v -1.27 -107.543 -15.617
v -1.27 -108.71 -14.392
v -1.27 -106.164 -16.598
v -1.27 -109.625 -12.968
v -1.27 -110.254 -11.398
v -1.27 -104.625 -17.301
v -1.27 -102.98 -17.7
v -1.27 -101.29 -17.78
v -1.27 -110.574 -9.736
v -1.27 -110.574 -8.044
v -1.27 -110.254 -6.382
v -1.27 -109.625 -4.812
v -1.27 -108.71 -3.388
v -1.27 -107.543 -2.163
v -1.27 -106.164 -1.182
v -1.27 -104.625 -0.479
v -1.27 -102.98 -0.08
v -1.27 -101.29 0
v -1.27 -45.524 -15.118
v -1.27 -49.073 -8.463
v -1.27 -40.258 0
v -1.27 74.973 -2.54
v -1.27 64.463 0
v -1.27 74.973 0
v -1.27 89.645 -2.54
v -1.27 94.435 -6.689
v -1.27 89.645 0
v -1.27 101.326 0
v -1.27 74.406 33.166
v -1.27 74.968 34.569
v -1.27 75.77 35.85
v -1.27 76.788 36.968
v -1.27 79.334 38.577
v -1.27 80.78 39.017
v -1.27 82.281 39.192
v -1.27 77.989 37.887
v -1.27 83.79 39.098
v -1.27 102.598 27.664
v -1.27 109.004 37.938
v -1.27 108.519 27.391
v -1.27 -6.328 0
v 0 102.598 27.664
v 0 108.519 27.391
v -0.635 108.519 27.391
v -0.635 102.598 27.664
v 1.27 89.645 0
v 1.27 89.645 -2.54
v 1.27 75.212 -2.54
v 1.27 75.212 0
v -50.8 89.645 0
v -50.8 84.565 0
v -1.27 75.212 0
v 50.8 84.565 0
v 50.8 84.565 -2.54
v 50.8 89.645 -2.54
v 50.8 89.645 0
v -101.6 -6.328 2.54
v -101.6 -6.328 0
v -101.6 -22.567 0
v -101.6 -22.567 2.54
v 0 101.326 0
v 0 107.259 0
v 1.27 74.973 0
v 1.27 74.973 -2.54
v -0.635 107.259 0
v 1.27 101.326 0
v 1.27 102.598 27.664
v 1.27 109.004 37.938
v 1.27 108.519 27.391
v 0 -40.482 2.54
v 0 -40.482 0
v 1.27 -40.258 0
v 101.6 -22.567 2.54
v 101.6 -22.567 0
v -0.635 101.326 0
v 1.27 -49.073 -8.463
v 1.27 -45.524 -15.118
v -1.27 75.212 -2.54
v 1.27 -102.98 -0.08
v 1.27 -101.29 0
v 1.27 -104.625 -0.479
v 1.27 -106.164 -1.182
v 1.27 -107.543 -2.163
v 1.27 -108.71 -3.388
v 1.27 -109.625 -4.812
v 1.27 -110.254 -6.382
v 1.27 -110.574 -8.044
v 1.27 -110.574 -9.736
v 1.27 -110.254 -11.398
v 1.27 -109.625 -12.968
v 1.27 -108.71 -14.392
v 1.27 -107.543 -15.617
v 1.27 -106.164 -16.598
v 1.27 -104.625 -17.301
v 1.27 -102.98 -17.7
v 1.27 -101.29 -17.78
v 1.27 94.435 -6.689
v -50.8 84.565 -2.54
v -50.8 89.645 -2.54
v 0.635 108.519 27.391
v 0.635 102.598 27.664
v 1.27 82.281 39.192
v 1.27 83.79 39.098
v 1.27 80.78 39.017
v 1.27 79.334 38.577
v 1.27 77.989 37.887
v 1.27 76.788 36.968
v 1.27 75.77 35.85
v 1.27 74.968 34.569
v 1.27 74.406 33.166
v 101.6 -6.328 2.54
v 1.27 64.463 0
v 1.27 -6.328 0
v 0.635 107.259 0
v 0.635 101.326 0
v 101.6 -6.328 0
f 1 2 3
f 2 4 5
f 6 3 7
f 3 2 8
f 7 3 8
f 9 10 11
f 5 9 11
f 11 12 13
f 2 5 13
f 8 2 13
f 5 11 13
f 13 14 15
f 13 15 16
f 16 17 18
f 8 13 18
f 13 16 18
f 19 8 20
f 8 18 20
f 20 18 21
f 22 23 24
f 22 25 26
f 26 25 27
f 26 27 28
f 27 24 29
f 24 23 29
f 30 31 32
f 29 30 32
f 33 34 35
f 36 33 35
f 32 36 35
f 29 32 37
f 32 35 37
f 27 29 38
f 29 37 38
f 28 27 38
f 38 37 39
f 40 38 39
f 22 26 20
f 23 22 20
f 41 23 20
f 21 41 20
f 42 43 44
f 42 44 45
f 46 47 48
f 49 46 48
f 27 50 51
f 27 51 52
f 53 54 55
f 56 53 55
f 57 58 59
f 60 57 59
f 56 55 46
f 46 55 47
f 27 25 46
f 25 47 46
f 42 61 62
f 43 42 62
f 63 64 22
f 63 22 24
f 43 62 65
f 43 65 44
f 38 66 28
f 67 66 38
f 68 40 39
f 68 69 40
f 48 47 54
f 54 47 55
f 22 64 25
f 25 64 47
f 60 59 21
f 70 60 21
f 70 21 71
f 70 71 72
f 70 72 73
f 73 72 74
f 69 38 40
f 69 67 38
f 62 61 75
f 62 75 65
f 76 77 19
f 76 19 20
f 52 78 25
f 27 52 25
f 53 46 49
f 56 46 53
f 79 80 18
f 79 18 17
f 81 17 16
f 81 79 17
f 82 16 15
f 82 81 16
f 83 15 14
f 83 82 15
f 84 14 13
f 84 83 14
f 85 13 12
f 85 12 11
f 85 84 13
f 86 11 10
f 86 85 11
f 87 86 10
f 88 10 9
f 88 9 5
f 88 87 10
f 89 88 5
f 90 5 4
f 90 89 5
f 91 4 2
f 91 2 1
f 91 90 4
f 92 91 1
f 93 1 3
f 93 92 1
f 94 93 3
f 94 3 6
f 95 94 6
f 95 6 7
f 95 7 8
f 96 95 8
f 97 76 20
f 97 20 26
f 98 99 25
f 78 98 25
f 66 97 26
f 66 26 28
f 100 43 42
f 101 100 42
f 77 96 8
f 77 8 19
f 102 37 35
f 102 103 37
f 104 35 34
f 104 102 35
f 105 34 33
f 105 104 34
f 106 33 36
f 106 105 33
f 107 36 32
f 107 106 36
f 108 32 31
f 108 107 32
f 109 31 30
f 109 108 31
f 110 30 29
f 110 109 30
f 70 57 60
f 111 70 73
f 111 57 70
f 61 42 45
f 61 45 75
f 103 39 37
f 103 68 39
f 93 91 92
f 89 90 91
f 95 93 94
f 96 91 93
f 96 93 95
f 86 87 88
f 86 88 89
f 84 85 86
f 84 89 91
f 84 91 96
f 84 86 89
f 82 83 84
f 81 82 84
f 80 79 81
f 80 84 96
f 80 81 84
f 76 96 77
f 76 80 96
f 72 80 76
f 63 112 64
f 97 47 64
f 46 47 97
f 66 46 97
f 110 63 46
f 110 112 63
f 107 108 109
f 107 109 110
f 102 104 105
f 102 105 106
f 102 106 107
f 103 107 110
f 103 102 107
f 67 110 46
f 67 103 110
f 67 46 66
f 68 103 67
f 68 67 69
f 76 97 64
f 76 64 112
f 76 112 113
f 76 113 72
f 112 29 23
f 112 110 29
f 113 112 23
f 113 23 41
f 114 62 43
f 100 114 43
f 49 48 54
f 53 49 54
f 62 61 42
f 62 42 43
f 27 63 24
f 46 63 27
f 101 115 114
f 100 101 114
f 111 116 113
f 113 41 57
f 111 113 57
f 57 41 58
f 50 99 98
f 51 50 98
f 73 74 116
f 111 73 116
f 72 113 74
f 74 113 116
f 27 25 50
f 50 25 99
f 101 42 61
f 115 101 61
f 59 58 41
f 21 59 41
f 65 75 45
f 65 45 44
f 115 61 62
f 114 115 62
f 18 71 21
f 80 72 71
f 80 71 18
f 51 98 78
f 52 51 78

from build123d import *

# Parameters (mm, degrees)
F0_W     = 14.672339
F0_H     = 2.54
F1_DEPTH = 1.27
F4_DEPTH = 2.54
F5_DEPTH = 0.635
F8_DEPTH = 2.54


with BuildPart() as f1:
    # F0 (on Right) → F1 (new body)
    with BuildSketch(Plane.YZ):
        with BuildLine():
            Line((64.462766, 0), (-101.290224, 0))
            ThreePointArc((-101.290224, 0), (-110.614697, -8.89), (-101.290224, -17.78))
            Line((-101.290224, -17.78), (-45.523856, -15.118071))
            Line((-45.523856, -15.118071), (-49.073096, -8.463248))
            Line((-49.073096, -8.463248), (94.435051, -6.689185))
            Line((94.435051, -6.689185), (101.325884, 0))
            Line((101.325884, 0), (102.598335, 27.663734))
            Line((102.598335, 27.663734), (108.518737, 27.391413))
            Line((108.518737, 27.391413), (109.003847, 37.937972))
            Line((109.003847, 37.937972), (83.790082, 39.097731))
            ThreePointArc((83.790082, 39.097731), (77.988792, 37.886764), (74.406086, 33.165999))
            Line((74.406086, 33.165999), (64.462766, 0))
        make_face()
        with Locations((82.308821, -1.27)):
            Rectangle(F0_W, F0_H, mode=Mode.SUBTRACT)
    extrude(amount=F1_DEPTH)

    # F2: F1 across plane


with BuildPart() as f1_1:
    add(f1.part)
    add(f1.part.mirror(Plane.YZ))

    # F3 (on face) → F4 (join)
    with BuildSketch(Plane.XY):
        Polygon((101.6, -6.327709), (0, -6.327709), (-101.6, -6.327709), (-101.6, -22.567421), (0, -40.482242), (101.6, -22.567421), align=None)
    extrude(amount=F4_DEPTH)


with BuildPart() as f5:
    # F0 (on Right) → F5 (new body)
    with BuildSketch(Plane.YZ):
        Polygon((107.258812, 0), (108.518737, 27.391413), (102.598335, 27.663734), (101.325884, 0), align=None)
    extrude(amount=F5_DEPTH)


with BuildPart() as f6_1:
    # F6: instance of F5
    add(f5.part.mirror(Plane.YZ))


with BuildPart() as f8:
    # F7 (on face) → F8 (new body)
    with BuildSketch(Plane.XY.offset(-2.54)):
        Polygon((50.8, 89.644991), (1.27, 89.644991), (1.27, 75.21246), (50.8, 84.564991), align=None)
        Polygon((-1.27, 75.21246), (-1.27, 89.644991), (-50.8, 89.644991), (-50.8, 84.564991), align=None)
    extrude(amount=F8_DEPTH)


solid = Compound([f1_1.part, f5.part, f6_1.part, f8.part])
